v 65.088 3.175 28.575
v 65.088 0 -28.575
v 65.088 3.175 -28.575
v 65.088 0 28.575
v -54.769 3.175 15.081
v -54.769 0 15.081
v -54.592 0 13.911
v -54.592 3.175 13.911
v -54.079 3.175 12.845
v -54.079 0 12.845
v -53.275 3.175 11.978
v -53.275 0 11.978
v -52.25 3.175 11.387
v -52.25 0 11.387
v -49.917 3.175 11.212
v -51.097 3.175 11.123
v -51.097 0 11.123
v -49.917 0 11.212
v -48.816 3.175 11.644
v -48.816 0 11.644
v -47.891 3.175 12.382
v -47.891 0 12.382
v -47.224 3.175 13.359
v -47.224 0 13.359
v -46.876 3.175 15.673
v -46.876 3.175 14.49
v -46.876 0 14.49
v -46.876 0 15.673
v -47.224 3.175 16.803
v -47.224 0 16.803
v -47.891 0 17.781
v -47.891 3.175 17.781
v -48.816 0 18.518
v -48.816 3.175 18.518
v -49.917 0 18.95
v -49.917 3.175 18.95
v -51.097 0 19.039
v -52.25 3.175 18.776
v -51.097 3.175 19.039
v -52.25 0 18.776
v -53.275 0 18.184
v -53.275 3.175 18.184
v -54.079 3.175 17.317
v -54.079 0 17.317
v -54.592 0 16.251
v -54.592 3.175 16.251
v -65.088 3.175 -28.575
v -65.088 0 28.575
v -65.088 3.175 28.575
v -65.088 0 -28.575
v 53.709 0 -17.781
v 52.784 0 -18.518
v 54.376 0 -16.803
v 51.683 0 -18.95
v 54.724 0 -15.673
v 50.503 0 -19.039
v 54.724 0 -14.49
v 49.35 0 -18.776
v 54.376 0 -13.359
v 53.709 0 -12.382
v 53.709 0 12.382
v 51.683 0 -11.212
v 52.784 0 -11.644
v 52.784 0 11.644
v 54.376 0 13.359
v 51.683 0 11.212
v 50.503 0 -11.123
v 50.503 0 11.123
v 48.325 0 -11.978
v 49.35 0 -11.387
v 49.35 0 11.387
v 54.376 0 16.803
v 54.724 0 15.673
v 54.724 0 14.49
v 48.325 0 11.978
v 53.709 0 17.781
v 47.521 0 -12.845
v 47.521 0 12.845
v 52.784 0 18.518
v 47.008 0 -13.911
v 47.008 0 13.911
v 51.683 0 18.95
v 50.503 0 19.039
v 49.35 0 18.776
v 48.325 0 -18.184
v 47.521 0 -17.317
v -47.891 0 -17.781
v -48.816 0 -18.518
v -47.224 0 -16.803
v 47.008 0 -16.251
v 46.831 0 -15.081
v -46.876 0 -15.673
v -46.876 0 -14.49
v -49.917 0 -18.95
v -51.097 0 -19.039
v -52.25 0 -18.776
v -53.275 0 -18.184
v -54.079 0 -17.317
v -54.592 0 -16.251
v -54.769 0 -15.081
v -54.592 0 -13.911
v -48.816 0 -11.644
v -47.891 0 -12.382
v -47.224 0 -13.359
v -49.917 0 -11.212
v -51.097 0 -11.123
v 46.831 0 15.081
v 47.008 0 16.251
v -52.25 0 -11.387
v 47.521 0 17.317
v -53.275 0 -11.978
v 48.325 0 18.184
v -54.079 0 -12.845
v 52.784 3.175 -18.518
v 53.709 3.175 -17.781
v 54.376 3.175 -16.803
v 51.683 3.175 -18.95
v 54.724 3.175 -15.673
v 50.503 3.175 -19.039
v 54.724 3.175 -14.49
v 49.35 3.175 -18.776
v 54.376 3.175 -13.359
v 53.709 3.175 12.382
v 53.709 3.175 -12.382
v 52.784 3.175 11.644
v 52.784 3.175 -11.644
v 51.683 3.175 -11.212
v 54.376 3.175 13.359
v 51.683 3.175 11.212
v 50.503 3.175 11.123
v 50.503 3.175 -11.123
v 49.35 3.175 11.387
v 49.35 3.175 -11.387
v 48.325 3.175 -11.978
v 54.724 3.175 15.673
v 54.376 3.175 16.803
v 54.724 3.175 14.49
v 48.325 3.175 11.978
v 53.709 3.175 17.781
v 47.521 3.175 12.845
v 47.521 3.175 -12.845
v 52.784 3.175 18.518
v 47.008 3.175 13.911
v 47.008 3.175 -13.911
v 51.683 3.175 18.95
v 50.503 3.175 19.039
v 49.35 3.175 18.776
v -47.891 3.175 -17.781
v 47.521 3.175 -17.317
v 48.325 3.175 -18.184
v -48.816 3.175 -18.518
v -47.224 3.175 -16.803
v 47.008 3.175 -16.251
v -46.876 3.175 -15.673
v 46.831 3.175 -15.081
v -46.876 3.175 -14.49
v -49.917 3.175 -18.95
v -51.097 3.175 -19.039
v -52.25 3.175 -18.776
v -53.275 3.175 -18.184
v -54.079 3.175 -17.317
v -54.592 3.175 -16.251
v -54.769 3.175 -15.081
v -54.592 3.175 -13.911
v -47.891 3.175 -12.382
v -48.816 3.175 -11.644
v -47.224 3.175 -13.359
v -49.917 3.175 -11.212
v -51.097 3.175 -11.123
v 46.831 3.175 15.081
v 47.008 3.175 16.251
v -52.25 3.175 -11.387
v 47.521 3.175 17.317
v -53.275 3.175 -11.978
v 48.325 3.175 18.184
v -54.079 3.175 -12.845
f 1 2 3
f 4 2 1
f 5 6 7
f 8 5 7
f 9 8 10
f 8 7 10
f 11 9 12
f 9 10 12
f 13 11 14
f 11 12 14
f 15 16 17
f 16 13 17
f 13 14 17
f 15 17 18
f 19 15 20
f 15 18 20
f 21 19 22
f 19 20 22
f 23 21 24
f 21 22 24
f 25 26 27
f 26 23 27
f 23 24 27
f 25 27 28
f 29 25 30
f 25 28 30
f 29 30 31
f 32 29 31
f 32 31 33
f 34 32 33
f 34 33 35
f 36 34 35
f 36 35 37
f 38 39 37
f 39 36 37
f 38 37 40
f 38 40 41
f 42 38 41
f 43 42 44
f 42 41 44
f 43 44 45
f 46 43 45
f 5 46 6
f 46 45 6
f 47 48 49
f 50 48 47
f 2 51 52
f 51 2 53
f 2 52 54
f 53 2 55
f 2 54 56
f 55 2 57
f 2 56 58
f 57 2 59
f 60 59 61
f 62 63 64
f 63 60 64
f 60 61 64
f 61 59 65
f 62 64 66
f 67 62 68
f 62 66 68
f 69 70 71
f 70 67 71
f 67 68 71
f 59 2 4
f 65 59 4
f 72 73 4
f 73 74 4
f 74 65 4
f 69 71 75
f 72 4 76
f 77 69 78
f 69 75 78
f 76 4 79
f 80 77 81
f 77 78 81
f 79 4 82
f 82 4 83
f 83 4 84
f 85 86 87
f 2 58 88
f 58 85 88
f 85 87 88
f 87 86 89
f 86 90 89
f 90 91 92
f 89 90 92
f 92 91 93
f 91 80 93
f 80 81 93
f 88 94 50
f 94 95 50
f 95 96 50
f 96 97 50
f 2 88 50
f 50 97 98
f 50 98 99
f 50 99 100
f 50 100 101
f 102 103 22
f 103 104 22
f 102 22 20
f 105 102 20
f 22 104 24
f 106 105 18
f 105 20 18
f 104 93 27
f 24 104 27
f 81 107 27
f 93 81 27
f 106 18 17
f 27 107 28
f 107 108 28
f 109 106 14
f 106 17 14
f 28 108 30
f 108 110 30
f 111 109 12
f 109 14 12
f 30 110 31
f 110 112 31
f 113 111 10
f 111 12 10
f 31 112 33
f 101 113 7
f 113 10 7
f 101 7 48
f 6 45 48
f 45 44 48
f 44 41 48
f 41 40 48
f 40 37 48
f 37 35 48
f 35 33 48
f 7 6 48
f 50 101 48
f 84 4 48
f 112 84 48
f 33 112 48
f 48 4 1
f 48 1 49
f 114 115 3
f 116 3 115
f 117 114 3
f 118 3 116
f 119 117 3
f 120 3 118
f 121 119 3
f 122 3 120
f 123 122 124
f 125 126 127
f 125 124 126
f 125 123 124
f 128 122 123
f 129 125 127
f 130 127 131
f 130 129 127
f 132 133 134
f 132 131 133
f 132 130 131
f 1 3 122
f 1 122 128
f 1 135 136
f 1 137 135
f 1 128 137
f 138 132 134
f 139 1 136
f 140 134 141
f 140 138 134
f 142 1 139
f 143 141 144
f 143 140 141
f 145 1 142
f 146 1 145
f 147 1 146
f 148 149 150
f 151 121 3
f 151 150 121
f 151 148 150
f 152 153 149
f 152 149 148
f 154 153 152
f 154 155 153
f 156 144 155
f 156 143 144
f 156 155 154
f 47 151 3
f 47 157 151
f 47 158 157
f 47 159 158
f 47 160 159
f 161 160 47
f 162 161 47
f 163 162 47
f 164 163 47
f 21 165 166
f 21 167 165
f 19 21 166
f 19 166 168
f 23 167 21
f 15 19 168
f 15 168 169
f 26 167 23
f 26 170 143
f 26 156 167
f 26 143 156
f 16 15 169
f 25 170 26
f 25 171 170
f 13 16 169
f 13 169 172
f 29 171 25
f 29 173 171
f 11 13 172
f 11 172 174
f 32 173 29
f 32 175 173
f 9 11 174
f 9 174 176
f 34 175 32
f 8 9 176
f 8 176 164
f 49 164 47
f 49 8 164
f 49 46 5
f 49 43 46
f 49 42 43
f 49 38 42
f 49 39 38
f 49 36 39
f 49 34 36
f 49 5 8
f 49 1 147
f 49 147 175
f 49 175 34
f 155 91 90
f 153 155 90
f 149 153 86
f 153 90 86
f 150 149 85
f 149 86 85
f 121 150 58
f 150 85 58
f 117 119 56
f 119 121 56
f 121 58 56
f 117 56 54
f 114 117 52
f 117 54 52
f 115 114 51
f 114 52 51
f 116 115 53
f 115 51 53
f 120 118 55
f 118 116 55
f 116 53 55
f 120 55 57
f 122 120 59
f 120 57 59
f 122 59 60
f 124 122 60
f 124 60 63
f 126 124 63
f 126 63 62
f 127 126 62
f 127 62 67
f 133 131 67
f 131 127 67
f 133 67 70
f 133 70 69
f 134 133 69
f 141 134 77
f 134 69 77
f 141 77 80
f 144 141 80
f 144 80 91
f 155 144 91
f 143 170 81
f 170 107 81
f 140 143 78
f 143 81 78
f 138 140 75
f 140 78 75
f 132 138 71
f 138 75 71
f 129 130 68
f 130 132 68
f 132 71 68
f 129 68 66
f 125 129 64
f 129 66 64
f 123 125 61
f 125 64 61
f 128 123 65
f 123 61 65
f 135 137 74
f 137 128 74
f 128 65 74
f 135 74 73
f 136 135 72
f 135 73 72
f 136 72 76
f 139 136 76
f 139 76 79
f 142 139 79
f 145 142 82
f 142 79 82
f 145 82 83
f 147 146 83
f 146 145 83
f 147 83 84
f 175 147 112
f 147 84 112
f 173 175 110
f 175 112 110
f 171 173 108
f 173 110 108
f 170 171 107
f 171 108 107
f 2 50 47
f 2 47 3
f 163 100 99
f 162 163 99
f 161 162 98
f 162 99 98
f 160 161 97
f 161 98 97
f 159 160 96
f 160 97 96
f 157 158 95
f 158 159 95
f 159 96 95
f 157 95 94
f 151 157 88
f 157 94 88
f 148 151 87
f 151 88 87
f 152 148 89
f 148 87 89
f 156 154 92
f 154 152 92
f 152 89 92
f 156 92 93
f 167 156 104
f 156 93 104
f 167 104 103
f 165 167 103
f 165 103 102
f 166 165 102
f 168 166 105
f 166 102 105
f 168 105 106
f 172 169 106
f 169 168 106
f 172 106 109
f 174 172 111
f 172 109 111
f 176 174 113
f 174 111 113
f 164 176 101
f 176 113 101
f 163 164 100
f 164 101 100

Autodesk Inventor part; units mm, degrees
ref_plane "YZ Plane" through (0, 0, 0) normal (1, 0, 0) x (0, 1, 0)
ref_plane "XZ Plane" through (0, 0, 0) normal (0, 1, 0) x (-1, 0, 0)
ref_plane "XY Plane" through (0, 0, 0) normal (0, 0, 1) x (1, 0, 0)
sketch "Sketch1" plane through (0, 0, 0) normal (0, 1, 0) x (-1, 0, 0)
  line L0 (0, -40.005) -> (0, 40.005) projected
  line L1 (91.1225, 0) -> (-91.1225, 0) projected
  line L2 (65.0875, -28.575) -> (-65.0875, -28.575)
  line L3 (-65.0875, -28.575) -> (-65.0875, 28.575)
  line L4 (-65.0875, 28.575) -> (65.0875, 28.575)
  line L5 (65.0875, 28.575) -> (65.0875, -28.575)
  circle A0 centre (50.8, -15.0812) radius 3.9688
  circle A1 centre (50.8, 15.0812) radius 3.9688
  circle A2 centre (-50.8, -15.0812) radius 3.9688
  circle A3 centre (-50.8, 15.0812) radius 3.9688
  point P0 (0, 0)
  dimension "d0" = 130.175
  dimension "d1" = 57.15
  dimension "d2" = 50.8
  dimension "d3" = 15.0813
  dimension "d4" = 7.9375
extrude "Extrusion1" add sketch "Sketch1" along normal blind 3.175
properties part number "Static_Caster_Plate"
